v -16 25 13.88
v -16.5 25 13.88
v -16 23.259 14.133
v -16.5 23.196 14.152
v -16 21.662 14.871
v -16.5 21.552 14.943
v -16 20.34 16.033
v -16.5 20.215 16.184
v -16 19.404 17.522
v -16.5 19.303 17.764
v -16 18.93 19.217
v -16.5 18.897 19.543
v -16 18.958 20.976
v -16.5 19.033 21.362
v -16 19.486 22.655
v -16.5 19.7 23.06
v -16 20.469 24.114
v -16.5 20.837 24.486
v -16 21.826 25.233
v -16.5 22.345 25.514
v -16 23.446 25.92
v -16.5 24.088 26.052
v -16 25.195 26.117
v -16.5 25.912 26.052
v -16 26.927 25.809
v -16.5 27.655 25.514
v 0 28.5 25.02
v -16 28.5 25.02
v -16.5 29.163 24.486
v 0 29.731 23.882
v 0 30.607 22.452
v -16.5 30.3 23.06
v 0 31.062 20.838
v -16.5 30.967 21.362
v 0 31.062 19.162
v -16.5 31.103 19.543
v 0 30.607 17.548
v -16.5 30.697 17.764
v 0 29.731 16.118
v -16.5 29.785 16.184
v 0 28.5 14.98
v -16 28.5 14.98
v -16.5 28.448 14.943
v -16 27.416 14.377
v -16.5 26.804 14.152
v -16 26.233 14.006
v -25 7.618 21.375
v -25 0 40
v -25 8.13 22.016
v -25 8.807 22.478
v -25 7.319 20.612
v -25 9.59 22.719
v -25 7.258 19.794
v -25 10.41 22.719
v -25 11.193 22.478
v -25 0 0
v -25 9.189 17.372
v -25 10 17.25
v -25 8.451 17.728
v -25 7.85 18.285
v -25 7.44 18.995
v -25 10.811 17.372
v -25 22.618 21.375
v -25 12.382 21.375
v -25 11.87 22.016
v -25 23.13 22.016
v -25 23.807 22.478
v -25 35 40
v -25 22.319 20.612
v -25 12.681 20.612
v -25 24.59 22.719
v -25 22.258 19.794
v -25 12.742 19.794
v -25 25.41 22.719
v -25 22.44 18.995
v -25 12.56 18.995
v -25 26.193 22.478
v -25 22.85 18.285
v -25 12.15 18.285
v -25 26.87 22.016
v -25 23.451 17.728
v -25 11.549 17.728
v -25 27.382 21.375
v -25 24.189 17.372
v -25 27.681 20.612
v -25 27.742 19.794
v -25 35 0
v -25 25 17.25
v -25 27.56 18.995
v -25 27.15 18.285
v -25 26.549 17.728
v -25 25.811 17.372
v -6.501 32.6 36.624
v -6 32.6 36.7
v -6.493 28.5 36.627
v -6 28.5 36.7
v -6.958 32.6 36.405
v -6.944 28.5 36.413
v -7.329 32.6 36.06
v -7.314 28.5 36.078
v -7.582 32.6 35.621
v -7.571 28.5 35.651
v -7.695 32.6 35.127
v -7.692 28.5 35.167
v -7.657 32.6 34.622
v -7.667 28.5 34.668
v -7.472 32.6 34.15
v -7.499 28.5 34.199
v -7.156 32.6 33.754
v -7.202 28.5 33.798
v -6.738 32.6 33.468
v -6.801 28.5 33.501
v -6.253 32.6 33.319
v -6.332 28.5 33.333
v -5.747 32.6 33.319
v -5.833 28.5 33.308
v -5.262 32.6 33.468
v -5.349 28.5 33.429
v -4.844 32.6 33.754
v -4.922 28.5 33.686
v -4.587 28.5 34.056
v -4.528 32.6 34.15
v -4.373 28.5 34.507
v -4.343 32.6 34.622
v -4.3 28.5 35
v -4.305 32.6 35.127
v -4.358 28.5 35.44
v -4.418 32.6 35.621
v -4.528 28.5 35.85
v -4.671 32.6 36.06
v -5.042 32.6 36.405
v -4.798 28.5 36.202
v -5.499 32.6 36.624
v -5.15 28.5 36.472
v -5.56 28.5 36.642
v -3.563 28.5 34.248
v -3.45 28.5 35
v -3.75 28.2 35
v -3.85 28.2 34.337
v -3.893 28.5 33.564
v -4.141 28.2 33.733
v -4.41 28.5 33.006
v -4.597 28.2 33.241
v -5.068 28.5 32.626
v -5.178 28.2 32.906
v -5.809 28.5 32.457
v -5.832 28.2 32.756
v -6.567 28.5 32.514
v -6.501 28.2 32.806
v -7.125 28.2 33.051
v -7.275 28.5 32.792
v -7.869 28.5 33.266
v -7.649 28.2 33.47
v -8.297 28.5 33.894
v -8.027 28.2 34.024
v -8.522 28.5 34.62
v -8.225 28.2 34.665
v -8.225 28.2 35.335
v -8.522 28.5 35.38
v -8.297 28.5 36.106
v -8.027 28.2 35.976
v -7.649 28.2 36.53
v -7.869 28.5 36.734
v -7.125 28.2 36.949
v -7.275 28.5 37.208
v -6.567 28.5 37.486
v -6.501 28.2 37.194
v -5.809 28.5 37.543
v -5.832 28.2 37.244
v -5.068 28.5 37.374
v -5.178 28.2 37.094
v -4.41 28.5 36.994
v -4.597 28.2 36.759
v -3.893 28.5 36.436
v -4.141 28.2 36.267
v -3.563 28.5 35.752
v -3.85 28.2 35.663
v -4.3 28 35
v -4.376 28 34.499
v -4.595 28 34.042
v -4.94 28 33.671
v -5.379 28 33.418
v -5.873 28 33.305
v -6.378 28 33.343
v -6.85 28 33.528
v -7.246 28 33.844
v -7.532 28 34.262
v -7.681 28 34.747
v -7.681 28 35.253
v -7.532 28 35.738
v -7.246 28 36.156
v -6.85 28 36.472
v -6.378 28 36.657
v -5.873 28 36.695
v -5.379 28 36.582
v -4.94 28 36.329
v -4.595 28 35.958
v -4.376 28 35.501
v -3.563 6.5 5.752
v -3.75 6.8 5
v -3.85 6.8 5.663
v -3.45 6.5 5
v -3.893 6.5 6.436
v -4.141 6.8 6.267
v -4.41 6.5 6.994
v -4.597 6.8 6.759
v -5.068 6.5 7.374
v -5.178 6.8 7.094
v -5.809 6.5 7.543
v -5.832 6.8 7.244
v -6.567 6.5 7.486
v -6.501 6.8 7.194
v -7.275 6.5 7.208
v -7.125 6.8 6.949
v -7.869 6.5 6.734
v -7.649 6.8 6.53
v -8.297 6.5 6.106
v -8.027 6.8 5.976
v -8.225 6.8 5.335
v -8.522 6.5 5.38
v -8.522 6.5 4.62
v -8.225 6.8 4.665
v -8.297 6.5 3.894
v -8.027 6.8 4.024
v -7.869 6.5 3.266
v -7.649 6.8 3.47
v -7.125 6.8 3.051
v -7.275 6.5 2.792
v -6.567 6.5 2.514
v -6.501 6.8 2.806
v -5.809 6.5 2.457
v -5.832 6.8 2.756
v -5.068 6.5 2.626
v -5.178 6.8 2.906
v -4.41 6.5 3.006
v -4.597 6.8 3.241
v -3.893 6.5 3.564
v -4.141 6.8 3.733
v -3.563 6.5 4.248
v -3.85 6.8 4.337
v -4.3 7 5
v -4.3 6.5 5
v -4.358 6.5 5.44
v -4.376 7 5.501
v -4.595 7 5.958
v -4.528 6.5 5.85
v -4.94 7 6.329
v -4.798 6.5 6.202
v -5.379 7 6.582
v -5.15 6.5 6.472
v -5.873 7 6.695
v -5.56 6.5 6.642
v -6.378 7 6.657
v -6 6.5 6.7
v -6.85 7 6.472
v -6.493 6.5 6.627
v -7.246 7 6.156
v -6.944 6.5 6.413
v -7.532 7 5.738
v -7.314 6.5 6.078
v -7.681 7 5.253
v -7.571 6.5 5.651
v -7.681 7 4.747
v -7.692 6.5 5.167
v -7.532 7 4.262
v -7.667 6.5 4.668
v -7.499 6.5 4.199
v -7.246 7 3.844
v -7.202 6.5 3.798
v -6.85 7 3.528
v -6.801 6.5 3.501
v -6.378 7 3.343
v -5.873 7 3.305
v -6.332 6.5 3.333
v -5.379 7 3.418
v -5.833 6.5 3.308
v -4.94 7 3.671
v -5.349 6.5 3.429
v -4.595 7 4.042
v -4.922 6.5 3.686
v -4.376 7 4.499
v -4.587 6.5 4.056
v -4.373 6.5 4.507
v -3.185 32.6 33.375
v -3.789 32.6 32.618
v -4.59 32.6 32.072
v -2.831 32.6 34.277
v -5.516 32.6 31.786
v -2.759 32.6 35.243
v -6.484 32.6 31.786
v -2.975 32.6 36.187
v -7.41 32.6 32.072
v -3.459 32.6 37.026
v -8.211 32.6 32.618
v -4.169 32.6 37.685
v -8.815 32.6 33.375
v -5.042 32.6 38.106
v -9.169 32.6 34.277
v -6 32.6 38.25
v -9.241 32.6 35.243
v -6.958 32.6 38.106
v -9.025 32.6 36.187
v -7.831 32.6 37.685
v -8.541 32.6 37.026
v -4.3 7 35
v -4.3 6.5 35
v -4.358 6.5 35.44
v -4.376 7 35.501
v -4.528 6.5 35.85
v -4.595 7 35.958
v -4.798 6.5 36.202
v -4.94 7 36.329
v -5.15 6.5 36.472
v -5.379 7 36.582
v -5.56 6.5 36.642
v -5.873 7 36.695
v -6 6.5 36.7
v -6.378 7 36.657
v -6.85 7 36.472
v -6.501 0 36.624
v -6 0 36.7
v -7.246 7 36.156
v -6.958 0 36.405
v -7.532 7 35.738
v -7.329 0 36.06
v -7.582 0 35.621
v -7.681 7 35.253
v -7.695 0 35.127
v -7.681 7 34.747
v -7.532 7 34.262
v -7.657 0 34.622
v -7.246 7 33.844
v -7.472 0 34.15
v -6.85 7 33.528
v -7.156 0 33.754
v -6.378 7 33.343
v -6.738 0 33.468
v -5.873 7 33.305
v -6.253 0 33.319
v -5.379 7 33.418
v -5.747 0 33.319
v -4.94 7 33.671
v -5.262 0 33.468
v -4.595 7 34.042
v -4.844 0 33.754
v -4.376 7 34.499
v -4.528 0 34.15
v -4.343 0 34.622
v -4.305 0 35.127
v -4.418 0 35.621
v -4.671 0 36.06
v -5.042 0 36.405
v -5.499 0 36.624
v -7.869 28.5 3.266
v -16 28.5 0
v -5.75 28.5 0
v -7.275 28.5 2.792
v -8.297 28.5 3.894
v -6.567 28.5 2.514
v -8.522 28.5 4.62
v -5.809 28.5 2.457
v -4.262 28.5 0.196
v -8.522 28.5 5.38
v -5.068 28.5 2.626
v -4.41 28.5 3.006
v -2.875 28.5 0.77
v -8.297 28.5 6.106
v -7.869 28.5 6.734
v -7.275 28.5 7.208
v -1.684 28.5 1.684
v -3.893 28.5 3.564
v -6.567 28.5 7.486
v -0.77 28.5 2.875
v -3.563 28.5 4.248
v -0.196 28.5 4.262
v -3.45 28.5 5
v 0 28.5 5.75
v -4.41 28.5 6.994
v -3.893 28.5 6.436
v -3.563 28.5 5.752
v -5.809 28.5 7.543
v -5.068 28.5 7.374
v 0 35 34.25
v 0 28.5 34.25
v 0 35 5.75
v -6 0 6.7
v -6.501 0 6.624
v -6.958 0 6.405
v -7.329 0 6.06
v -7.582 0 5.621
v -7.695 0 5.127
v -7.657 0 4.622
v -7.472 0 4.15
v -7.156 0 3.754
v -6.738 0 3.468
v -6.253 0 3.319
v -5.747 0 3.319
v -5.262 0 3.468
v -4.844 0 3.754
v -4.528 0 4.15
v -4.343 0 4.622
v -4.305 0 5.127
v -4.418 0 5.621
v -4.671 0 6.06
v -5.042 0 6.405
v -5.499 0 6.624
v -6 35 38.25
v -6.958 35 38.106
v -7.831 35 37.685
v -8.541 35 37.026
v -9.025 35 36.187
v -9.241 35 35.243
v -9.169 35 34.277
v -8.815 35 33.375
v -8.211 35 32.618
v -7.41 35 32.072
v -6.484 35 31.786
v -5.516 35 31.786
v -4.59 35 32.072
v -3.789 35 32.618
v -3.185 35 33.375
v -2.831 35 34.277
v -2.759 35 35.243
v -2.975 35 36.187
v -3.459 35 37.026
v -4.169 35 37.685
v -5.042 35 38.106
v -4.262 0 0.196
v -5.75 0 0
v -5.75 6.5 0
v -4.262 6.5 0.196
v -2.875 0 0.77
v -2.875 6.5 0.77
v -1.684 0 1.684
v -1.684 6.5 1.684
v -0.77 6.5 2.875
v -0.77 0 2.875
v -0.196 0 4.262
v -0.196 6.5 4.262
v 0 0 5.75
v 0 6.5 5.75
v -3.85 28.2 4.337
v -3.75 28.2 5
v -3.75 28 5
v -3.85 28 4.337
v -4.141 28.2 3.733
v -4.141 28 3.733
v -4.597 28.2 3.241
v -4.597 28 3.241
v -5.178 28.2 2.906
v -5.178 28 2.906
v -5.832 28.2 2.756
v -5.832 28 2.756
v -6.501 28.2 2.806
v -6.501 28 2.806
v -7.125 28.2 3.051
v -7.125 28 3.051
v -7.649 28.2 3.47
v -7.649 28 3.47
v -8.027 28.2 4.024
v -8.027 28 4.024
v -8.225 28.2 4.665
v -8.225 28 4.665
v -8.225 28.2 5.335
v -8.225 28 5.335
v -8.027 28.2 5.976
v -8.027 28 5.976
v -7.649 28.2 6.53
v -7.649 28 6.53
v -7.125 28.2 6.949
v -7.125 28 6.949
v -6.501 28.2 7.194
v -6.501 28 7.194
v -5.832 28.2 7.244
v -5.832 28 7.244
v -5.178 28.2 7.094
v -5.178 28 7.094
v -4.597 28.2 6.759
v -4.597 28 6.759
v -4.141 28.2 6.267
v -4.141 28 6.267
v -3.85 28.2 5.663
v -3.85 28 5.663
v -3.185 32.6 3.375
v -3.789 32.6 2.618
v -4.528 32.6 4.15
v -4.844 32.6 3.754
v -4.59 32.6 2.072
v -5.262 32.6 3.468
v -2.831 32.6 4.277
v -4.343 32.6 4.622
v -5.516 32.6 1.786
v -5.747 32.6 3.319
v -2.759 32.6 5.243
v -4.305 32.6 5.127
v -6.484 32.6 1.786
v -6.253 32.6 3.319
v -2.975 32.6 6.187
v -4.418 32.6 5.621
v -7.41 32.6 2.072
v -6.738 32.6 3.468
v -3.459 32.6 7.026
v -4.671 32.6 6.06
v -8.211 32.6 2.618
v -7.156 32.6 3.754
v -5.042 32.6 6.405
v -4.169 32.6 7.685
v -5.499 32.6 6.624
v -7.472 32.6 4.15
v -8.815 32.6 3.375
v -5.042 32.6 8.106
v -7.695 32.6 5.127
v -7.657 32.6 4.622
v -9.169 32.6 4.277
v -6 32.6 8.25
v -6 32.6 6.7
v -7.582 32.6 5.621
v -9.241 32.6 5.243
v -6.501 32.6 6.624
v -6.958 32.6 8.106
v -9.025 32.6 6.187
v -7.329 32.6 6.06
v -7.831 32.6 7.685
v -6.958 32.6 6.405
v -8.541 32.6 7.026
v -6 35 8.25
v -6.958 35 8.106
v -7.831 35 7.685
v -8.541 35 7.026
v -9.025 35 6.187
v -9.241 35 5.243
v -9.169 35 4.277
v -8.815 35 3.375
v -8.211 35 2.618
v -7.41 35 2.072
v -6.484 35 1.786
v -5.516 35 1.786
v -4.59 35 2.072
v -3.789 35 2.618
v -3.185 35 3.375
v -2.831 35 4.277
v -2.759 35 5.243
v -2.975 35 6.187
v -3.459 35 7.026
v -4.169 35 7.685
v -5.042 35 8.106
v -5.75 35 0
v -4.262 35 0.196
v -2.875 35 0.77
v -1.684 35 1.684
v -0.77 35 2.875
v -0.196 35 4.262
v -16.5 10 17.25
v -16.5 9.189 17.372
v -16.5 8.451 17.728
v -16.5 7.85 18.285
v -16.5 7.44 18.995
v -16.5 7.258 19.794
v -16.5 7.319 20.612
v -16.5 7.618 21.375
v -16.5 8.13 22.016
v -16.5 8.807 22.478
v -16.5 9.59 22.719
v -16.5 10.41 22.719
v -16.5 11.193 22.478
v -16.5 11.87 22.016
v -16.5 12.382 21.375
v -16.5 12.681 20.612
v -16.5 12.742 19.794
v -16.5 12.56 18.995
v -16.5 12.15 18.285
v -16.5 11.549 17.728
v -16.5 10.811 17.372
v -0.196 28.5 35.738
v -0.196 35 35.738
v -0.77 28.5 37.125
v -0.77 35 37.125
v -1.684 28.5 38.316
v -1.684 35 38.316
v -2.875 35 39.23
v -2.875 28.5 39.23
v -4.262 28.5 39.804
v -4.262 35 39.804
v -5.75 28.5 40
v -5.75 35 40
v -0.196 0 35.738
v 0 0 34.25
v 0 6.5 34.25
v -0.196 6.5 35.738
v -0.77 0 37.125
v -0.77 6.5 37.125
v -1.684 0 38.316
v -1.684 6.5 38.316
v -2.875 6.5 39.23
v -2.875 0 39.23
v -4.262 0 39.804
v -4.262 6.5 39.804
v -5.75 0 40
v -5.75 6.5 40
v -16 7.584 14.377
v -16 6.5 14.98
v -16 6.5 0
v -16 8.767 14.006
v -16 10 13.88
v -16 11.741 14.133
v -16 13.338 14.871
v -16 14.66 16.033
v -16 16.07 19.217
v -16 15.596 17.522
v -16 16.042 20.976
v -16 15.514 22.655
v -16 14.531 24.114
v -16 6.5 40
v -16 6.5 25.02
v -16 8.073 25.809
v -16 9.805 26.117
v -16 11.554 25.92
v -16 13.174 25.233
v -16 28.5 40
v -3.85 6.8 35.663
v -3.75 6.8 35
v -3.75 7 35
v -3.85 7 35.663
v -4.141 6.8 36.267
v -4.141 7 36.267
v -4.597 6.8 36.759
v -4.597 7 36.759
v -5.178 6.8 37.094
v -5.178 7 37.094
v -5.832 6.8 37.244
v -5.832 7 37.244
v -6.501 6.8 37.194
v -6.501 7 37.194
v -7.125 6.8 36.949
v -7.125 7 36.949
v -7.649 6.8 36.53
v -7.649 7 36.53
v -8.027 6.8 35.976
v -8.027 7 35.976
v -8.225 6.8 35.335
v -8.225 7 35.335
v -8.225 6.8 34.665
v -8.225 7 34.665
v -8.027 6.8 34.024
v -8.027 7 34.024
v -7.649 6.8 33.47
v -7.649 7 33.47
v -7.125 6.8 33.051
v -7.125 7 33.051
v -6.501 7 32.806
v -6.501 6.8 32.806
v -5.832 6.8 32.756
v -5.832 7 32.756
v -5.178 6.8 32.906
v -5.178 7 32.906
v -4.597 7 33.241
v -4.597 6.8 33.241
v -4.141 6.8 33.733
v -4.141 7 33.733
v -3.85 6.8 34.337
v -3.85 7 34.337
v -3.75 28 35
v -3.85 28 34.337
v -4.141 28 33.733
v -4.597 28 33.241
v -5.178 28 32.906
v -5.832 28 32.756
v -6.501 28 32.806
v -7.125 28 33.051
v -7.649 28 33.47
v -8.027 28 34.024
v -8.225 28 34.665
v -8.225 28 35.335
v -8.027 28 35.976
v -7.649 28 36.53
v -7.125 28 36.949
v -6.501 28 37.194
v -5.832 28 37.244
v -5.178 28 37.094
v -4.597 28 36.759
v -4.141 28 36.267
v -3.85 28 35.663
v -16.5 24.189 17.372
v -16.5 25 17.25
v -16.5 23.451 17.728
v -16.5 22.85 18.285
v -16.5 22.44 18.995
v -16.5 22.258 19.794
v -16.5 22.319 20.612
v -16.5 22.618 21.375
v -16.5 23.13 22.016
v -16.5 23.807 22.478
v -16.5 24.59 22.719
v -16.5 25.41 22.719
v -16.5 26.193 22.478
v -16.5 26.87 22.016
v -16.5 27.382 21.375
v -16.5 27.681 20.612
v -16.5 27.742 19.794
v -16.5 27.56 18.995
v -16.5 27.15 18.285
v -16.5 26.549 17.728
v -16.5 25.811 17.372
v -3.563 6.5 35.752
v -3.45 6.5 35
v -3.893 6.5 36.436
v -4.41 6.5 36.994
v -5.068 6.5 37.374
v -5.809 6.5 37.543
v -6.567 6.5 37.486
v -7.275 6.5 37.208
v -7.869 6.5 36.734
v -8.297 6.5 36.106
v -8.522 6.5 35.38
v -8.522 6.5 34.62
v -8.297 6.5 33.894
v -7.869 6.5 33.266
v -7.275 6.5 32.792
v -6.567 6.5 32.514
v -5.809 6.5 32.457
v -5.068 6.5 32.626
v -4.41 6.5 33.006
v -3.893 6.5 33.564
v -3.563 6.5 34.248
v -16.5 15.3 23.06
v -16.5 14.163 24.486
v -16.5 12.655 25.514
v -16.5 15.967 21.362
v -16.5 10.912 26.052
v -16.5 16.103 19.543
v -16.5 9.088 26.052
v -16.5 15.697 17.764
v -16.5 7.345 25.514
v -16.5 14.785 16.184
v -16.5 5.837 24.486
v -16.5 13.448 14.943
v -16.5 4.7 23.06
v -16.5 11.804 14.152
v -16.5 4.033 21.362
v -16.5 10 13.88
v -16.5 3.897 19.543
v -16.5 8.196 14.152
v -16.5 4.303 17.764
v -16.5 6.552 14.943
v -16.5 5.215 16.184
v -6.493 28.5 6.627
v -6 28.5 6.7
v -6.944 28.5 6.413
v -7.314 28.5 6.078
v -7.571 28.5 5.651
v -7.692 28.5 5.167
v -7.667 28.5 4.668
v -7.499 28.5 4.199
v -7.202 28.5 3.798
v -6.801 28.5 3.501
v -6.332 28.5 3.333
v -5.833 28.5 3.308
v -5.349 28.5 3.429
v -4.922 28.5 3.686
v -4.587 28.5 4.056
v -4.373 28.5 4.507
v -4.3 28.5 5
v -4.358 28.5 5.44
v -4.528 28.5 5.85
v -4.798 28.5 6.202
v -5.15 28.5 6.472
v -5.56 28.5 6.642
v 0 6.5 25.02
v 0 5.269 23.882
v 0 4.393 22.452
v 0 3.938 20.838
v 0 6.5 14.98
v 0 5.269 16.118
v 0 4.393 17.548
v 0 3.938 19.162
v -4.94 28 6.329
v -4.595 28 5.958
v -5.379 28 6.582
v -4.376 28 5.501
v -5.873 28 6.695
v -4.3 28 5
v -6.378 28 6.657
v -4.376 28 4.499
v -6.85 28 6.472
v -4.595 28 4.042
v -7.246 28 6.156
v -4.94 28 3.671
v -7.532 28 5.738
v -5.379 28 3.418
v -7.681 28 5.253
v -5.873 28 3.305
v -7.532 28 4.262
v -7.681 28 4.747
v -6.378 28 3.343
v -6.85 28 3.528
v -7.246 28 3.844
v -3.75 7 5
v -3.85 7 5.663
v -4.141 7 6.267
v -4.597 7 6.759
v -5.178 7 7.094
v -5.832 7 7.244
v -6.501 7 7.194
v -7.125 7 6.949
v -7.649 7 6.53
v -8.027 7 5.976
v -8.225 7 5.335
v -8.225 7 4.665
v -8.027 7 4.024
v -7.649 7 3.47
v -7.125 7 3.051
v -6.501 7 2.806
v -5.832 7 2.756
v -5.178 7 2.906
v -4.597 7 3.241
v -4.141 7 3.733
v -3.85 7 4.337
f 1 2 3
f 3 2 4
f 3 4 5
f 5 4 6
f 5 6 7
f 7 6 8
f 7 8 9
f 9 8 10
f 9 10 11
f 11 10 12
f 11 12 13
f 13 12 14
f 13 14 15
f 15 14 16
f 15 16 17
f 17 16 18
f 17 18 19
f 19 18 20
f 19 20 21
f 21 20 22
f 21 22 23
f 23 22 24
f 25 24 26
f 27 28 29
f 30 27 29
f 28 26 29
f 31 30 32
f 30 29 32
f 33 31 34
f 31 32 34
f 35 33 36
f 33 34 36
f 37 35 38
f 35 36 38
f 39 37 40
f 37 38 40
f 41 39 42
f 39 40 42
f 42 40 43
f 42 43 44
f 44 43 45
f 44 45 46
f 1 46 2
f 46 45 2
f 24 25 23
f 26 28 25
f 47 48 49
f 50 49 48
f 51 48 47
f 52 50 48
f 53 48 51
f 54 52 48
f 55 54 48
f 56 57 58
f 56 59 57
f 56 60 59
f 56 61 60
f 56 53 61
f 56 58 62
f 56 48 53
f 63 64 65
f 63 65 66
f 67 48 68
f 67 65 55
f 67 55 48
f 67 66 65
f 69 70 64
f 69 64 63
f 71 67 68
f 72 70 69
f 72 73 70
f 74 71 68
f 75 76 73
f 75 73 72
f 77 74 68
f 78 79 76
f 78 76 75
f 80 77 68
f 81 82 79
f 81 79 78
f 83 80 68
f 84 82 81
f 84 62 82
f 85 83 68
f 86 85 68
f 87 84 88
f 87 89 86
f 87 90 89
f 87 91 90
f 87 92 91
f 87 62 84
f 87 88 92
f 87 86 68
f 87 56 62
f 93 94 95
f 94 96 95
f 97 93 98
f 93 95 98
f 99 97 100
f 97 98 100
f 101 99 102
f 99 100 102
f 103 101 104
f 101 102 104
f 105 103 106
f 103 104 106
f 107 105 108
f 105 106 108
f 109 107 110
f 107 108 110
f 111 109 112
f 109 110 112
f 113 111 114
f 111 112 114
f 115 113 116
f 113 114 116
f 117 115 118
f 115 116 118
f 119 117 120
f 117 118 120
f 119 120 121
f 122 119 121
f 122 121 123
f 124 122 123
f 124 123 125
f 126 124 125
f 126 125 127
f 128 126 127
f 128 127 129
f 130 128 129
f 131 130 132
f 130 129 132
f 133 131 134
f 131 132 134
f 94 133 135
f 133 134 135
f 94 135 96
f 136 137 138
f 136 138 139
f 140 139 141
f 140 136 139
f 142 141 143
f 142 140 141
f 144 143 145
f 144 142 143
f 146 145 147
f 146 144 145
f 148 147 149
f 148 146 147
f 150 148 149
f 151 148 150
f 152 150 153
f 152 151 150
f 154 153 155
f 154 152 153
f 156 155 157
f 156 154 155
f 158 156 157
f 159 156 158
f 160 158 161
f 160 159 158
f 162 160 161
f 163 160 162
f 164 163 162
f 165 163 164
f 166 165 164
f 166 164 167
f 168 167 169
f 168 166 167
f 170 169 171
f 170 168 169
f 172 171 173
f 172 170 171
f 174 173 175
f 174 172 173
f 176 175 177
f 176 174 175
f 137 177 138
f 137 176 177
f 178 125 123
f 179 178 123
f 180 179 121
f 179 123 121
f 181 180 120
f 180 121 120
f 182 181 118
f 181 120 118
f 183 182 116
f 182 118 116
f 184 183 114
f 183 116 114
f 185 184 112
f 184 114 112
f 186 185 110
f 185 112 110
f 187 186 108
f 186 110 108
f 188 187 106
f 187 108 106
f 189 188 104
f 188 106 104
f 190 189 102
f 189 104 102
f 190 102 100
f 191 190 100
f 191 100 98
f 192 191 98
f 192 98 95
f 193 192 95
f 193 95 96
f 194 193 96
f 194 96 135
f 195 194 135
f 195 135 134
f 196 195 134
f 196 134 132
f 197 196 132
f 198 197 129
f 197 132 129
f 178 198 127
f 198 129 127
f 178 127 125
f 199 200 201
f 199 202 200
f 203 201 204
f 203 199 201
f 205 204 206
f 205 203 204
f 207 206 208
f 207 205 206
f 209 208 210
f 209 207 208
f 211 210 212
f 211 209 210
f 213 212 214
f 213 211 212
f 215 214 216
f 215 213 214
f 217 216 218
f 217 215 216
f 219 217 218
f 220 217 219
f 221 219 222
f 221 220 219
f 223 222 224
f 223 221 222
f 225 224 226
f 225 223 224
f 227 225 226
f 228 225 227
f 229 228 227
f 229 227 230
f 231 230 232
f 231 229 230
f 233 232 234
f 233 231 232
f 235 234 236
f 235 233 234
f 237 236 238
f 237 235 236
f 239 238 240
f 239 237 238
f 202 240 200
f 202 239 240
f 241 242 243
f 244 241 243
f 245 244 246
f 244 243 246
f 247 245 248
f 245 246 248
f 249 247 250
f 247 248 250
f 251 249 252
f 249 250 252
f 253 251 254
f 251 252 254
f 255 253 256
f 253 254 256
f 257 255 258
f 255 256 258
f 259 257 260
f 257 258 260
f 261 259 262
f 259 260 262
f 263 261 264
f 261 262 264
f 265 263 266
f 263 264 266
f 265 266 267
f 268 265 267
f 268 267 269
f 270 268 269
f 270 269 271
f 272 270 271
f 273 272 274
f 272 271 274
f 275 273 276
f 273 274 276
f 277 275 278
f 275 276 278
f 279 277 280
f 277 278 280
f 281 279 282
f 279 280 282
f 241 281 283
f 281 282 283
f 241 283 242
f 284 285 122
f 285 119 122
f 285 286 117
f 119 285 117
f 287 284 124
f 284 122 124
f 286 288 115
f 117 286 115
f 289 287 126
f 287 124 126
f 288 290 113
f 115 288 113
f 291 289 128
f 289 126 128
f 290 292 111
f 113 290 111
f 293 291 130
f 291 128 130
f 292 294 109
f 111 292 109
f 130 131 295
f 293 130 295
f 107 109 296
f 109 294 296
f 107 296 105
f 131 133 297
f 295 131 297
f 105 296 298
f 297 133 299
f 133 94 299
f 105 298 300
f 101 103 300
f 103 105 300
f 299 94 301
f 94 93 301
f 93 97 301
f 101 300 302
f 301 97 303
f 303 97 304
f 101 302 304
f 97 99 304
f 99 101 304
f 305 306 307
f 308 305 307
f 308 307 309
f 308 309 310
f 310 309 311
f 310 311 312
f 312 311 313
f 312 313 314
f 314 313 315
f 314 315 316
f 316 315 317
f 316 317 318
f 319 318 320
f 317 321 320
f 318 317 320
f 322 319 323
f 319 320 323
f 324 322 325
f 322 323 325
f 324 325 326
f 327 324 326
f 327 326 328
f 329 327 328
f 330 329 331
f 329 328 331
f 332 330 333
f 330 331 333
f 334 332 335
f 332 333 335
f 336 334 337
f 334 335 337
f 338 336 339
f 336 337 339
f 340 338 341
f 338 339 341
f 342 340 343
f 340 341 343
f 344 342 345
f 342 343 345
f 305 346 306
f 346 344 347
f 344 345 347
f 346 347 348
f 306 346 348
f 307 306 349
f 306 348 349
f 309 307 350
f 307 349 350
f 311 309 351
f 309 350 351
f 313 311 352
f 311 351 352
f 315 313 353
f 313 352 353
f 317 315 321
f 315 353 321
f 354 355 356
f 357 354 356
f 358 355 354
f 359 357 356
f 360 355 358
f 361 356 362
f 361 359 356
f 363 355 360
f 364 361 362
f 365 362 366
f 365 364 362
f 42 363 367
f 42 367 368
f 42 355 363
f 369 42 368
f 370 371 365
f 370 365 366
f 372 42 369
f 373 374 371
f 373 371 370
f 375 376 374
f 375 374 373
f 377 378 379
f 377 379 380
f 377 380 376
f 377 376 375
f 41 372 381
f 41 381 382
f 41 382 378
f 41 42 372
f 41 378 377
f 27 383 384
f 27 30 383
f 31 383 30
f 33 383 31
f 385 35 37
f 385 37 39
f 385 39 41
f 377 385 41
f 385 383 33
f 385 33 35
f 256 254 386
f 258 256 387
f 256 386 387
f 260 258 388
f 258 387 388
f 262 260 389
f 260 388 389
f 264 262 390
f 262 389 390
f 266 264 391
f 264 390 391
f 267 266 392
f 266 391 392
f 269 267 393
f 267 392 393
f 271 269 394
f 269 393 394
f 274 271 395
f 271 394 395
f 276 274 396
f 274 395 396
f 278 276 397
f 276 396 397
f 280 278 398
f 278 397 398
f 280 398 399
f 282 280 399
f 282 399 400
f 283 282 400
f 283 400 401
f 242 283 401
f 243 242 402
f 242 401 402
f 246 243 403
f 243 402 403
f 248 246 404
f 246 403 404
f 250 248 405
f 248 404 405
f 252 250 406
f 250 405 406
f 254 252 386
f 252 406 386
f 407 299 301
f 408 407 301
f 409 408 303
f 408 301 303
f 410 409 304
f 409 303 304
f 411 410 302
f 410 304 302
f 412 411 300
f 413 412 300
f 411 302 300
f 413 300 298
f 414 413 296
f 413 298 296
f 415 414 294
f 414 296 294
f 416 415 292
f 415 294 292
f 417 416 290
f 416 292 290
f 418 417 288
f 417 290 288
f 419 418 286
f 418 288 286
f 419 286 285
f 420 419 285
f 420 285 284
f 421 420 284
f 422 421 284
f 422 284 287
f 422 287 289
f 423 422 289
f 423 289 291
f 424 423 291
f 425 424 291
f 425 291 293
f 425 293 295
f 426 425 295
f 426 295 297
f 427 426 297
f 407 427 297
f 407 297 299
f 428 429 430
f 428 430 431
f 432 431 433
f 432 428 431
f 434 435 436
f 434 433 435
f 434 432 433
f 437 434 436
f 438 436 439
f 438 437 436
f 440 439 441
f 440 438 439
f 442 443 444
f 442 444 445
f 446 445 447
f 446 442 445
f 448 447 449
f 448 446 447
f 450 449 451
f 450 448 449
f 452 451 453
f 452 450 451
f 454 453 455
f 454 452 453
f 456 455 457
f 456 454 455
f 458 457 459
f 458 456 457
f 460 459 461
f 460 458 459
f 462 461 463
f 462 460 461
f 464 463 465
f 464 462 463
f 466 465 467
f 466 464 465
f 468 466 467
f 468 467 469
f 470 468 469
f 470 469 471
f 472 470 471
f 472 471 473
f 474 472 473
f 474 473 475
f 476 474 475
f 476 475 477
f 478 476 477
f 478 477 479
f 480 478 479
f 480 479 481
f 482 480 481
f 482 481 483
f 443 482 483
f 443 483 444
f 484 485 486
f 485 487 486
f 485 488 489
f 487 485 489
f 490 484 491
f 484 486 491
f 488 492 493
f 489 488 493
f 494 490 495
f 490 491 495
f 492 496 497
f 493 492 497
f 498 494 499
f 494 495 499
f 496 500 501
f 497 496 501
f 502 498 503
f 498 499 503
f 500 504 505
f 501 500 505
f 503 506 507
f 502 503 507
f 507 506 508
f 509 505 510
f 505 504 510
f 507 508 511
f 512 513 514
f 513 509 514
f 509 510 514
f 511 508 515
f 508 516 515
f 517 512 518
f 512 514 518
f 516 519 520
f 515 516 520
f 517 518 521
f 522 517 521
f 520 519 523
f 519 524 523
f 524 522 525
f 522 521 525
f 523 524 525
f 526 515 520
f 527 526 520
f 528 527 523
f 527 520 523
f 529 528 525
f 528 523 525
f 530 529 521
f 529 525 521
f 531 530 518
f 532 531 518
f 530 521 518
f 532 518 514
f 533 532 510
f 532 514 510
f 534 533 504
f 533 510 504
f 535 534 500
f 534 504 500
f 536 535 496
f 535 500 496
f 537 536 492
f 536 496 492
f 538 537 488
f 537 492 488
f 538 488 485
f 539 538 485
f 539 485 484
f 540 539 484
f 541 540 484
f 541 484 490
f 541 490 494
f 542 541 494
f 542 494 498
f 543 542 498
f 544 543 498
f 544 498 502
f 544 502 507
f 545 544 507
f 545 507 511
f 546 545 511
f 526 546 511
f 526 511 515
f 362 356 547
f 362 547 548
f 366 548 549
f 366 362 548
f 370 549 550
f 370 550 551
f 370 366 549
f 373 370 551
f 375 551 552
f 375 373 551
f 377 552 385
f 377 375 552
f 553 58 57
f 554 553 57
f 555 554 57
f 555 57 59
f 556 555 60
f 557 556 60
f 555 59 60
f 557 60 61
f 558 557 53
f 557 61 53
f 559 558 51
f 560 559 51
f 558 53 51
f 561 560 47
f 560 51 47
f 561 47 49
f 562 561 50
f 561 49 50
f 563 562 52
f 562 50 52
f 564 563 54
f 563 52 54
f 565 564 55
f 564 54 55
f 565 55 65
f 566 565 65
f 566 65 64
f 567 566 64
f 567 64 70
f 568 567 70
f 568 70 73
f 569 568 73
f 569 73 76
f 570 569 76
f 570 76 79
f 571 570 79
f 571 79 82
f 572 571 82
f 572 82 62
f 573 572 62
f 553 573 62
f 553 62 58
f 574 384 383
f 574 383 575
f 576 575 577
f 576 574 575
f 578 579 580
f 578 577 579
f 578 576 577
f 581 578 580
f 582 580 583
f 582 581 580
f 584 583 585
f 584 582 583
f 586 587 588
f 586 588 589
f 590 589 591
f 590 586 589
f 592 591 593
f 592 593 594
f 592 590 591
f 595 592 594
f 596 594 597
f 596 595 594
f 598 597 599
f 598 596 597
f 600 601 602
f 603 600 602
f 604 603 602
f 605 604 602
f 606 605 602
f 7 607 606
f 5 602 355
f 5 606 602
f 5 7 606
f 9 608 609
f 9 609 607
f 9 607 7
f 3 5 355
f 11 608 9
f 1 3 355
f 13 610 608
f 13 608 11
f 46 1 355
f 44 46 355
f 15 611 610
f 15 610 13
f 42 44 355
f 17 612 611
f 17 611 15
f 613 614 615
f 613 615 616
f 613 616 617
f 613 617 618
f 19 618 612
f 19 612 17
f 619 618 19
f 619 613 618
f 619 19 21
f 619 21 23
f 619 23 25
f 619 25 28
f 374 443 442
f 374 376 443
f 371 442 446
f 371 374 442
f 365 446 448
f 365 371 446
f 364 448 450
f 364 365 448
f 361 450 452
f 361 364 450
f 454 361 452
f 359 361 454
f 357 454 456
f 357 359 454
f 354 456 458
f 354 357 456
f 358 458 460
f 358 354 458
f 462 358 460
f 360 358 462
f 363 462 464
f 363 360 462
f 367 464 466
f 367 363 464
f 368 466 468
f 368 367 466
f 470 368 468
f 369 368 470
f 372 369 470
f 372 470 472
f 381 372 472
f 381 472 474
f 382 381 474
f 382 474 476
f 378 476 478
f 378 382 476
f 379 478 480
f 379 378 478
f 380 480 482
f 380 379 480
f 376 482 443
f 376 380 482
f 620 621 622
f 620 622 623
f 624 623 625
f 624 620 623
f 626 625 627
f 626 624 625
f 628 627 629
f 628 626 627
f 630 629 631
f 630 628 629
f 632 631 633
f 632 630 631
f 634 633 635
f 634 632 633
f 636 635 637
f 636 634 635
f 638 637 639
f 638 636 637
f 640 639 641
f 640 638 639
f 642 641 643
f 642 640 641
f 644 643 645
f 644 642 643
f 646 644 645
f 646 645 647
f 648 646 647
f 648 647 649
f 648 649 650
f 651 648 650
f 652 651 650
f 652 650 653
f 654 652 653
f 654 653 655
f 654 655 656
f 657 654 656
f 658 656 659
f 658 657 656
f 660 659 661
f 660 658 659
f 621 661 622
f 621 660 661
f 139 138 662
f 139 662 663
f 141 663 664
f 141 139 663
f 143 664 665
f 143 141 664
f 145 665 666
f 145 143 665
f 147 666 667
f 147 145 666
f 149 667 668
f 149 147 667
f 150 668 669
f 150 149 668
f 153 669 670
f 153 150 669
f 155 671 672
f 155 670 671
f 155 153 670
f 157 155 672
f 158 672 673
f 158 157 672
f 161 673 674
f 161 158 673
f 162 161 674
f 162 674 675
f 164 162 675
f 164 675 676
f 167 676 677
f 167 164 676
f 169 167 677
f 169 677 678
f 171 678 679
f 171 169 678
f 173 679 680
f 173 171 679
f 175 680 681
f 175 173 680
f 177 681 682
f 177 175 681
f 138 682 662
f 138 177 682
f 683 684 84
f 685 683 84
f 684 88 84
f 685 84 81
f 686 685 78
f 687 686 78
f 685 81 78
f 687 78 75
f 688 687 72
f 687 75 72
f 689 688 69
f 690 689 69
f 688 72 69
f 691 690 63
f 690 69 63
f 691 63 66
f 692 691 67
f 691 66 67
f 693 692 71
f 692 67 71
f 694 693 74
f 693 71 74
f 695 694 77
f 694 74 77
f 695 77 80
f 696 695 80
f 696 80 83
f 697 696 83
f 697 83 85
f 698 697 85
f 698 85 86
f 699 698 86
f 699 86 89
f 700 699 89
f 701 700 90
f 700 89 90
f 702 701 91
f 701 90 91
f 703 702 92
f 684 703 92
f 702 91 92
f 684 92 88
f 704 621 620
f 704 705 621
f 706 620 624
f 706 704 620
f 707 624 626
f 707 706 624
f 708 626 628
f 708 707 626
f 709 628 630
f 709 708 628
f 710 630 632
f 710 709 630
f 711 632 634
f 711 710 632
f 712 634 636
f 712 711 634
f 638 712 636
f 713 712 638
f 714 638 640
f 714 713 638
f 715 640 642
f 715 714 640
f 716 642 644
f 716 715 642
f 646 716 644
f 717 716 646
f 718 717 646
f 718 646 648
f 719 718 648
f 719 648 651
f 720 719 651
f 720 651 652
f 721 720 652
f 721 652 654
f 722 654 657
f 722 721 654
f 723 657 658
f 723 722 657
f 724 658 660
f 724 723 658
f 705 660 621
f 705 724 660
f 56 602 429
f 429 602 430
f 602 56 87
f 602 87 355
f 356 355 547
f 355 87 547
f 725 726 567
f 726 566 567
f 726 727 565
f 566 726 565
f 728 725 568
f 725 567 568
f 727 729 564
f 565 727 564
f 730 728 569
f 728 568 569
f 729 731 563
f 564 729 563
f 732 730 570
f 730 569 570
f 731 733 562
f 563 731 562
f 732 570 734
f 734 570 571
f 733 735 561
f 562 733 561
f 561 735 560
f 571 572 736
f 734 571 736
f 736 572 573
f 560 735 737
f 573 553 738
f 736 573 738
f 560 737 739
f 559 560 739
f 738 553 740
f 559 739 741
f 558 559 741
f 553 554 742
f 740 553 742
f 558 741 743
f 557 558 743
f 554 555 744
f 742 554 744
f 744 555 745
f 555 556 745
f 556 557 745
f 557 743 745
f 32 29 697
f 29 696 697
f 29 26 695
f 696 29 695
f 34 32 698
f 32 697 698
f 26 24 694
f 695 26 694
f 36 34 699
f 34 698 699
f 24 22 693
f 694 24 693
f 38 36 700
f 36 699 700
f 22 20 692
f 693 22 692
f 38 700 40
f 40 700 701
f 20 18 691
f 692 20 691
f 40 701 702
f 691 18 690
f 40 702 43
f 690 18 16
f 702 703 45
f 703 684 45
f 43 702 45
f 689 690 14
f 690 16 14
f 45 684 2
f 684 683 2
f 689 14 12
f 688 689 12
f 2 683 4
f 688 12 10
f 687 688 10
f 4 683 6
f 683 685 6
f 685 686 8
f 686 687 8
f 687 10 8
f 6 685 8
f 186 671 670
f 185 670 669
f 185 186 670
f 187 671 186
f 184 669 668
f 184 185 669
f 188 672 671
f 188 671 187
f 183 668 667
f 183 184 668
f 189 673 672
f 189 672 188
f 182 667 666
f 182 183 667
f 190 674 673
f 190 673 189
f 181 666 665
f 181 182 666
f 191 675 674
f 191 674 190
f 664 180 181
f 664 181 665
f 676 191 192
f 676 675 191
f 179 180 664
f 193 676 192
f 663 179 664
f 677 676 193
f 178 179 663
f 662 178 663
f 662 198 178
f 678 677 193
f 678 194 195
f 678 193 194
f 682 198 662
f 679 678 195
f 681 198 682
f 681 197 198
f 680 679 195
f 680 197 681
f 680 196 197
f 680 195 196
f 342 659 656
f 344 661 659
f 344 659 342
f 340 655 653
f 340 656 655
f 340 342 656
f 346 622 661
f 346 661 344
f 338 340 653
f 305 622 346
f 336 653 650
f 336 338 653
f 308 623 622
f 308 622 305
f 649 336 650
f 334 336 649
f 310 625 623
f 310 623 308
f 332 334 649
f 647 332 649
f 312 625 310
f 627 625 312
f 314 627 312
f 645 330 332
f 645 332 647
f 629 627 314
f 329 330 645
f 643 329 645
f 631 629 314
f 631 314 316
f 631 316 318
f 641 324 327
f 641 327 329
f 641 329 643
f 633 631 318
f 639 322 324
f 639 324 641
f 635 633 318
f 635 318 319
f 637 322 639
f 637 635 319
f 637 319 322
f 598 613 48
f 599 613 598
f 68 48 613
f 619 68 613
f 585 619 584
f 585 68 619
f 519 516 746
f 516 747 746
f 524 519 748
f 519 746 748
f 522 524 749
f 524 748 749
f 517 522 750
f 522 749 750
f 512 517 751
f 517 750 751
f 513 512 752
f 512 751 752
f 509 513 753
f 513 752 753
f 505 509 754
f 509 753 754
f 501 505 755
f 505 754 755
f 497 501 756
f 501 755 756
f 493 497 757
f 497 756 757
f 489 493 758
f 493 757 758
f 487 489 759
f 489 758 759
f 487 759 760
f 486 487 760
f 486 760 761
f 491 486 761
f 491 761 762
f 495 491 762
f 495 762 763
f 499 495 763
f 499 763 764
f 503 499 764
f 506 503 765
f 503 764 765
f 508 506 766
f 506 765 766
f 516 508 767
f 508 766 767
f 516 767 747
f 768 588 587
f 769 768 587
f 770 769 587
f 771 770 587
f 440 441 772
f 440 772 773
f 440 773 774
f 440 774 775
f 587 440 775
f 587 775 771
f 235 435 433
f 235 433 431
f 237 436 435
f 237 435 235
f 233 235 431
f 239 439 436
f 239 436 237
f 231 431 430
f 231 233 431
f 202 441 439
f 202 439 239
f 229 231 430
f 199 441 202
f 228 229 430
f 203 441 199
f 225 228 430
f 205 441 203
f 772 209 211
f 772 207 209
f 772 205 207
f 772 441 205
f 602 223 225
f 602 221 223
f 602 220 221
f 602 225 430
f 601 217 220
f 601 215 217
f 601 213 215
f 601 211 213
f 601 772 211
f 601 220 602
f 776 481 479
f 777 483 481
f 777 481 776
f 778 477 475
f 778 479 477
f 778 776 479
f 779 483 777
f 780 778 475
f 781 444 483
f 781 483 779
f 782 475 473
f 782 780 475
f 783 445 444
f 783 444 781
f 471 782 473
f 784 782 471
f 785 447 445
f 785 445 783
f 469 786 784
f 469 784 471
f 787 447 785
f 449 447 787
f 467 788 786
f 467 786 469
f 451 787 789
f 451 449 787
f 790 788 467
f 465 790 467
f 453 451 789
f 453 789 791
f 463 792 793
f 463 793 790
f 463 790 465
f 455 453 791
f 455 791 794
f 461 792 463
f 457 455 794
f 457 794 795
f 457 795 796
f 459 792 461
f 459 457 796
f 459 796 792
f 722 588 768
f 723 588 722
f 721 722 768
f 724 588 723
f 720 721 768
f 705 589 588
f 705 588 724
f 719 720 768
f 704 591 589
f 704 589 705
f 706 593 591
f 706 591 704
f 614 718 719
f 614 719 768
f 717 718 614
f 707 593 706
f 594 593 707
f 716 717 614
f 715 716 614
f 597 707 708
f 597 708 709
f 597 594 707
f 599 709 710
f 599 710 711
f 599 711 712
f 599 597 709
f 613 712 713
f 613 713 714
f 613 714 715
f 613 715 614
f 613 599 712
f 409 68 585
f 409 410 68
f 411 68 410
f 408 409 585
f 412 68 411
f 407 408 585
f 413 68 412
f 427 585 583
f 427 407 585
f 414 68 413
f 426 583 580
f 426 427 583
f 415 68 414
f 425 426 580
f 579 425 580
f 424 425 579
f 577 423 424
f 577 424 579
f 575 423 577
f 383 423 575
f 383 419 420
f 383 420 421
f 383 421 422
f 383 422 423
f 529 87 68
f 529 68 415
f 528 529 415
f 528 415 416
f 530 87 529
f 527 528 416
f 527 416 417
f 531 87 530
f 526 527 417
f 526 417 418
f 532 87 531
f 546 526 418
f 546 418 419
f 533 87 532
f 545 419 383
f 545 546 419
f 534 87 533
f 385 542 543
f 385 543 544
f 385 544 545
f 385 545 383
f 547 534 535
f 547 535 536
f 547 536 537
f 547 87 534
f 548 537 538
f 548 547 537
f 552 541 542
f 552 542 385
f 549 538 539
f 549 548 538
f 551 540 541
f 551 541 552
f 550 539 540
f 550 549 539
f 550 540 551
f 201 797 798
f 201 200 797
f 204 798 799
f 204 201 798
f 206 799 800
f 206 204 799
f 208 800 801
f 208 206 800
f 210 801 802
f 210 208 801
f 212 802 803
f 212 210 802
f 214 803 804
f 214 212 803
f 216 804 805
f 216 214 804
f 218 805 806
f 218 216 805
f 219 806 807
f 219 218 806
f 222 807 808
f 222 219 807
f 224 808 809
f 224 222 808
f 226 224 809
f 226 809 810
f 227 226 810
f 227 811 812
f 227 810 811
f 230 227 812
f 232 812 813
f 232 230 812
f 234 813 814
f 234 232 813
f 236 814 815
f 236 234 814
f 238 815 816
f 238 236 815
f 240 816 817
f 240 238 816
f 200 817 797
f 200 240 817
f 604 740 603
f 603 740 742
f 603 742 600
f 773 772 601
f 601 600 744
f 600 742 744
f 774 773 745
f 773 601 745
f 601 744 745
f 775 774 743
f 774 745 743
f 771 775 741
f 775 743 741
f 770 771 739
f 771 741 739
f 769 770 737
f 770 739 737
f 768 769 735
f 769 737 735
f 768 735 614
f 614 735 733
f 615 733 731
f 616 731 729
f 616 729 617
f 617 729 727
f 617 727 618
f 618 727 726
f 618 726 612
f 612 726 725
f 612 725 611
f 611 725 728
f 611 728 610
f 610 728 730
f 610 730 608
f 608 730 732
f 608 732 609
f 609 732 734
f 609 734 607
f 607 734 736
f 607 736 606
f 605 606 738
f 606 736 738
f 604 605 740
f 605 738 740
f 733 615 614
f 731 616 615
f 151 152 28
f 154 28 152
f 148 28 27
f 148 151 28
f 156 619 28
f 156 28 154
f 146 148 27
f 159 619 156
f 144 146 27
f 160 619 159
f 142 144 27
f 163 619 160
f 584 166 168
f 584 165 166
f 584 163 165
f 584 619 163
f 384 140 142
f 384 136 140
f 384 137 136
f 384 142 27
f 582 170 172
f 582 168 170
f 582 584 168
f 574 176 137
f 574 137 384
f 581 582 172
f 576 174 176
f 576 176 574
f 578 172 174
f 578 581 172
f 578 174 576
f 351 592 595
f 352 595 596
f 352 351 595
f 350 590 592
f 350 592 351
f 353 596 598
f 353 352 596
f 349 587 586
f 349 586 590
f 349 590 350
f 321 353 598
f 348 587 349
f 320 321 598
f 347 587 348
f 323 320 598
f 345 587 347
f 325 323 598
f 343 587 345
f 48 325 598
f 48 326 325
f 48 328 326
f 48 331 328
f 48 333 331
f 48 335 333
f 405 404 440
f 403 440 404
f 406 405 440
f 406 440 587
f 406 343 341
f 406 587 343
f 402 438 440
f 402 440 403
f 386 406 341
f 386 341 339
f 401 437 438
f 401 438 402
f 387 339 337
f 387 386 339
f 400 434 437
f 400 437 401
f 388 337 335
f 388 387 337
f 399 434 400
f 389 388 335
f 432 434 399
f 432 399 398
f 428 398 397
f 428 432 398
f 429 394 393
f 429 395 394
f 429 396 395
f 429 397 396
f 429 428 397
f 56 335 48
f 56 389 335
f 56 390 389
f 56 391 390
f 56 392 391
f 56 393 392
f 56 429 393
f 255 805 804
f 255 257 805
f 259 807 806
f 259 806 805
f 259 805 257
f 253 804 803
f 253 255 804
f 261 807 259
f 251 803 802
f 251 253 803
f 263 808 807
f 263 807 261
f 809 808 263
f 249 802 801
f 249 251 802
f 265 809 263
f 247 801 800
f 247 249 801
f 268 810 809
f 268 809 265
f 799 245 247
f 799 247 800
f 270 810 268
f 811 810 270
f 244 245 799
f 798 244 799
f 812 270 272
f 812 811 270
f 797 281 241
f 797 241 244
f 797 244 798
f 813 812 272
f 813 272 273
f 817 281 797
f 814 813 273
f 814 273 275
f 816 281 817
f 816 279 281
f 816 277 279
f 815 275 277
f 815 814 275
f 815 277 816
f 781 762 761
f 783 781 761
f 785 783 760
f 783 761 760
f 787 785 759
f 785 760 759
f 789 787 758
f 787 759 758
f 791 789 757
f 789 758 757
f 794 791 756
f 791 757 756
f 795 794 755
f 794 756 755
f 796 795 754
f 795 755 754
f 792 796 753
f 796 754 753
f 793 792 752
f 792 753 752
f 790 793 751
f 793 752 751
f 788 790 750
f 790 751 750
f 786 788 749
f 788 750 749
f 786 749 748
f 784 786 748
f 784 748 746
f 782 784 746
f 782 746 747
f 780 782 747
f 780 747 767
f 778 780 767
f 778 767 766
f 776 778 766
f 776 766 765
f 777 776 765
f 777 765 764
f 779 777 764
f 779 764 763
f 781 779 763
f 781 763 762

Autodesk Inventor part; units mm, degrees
ref_plane "YZ Plane" through (0, 0, 0) normal (1, 0, 0) x (0, 1, 0)
ref_plane "XZ Plane" through (0, 0, 0) normal (0, 1, 0) x (-1, 0, 0)
ref_plane "XY Plane" through (0, 0, 0) normal (0, 0, 1) x (1, 0, 0)
sketch "Skizze1" plane through (0, 0, 0) normal (0, 0, 1) x (1, 0, 0)
  line L0 (0, 0) -> (-25, 0)
  line L1 (-25, 0) -> (-25, 35)
  line L2 (-25, 35) -> (0, 35)
  line L3 (0, 35) -> (0, 0)
  dimension "d0" = 25
  dimension "d1" = 35
extrude "Extrusion1" add sketch "Skizze1" along normal blind 40
sketch "Skizze2" plane through (0, 0, 40) normal (0, 0, 1) x (1, 0, 0)
  line L0 (0, 6.5) -> (-16, 6.5)
  line L1 (-16, 6.5) -> (-16, 28.5)
  line L2 (-16, 28.5) -> (0, 28.5)
  line L3 (0, 28.5) -> (0, 6.5)
  line L4 (-25, 0) -> (0, 0) projected
  line L5 (0, 35) -> (-25, 35) projected
  line L6 (0, 0) -> (0, 35) projected
  dimension "d4" = 22
  dimension "d5" = 35
  dimension "d6" = 6.5
  dimension "d7" = 16
extrude "Extrusion2" cut sketch "Skizze2" against normal blind 40
sketch "Skizze3" plane through (0, 0, 40) normal (1, 0, 0) x (0, 0, -1)
  line L0 (0, 6.5) -> (0, 28.5) projected
  line L1 (40, 28.5) -> (40, 6.5) projected
  line L2 (40, 6.5) -> (0, 6.5) projected
  line L3 (40, 35) -> (0, 35) projected
  line L4 (40, 0) -> (0, 0) projected
  point P0 (20, 10)
  point P1 (20, 25)
  dimension "d10" = 15
  dimension "d11" = 20
  dimension "d12" = 40
  dimension "d15" = 35
  dimension "d16" = 10
hole "Bohrung1" at (0, 10, 20) at (0, 25, 20) direction (-1, 0, 0) diameter 5.5 end through all counterbore diameter 12.24 counterbore depth 16.5 clearance for "Sechskantbolzen" size "M5" standard "ANSI Metrisches M Profil"
sketch "Skizze4" plane through (-25, 35, 0) normal (0, 1, 0) x (1, 0, 0)
  line L0 (9, -40) -> (9, 0) projected
  line L1 (9, -40) -> (9, 0) projected
  line L2 (9, -13.88) -> (9, -26.12) projected
  line L3 (25, -40) -> (0, -40) projected
  line L4 (0, 0) -> (25, 0) projected
  point P0 (9, -14.9796)
  point P1 (9, -25.0204)
  point P2 (19, -5)
  point P3 (19, -35)
  dimension "d24" = 5
  dimension "d25" = 5
  dimension "d26" = 10
hole "Bohrung2" at (-6, 35, 5) at (-6, 35, 35) direction (0, -1, 0) diameter 3.4 end through all counterbore diameter 6.5 counterbore depth 2.4 clearance for "Zylinderschraube mit Schlitz DIN 84" size "M3" standard "DIN"
sketch "Skizze5" plane through (-16, 28.5, 40) normal (0, -1, 0) x (1, 0, 0)
  circle A0 centre (10, -5) radius 2.25
  circle A1 centre (10, -5) radius 1.7 projected
  point P0 (16, -40)
  dimension "d34" = 4.5
extrude "Extrusion3" add sketch "Skizze5" along normal blind 0.5
chamfer "Fase1" distance 0.3 angle 45 1 edges at (-8.25, 28.5, 35)
ref_plane "Arbeitsebene1" through (-25, 17.5, 0) normal (0, -1, 0) x (1, 0, 0)
ref_plane "Arbeitsebene2" through (0, 0, 20) normal (0, 0, 1) x (1, 0, 0)
mirror "Spiegeln1" about plane through (0, 0, 20) normal (0, 0, 1) of "Extrusion3", "Fase1"
mirror "Spiegeln2" about plane through (-25, 17.5, 0) normal (0, -1, 0) of "Extrusion3"
chamfer "Fase2" distance 0.3 angle 45 1 edges at (-8.25, 6.5, 35)
mirror "Spiegeln3" about plane through (0, 0, 20) normal (0, 0, 1) of "Extrusion3", "Spiegeln2", "Fase2"
fillet "Rundung1" radius 5.75 4 edges at (0, 3.25, 0) (0, 3.25, 40) (0, 31.75, 40) (0, 31.75, 0)
equation "\"d6\" = -0.5 * d4 + 0.5 * d5"
equation "\"d11\" = 0.5 * d12"
equation "\"d16\" = -0.5 * d10 + 0.5 * d15"
properties part number "belt_tensioner"
